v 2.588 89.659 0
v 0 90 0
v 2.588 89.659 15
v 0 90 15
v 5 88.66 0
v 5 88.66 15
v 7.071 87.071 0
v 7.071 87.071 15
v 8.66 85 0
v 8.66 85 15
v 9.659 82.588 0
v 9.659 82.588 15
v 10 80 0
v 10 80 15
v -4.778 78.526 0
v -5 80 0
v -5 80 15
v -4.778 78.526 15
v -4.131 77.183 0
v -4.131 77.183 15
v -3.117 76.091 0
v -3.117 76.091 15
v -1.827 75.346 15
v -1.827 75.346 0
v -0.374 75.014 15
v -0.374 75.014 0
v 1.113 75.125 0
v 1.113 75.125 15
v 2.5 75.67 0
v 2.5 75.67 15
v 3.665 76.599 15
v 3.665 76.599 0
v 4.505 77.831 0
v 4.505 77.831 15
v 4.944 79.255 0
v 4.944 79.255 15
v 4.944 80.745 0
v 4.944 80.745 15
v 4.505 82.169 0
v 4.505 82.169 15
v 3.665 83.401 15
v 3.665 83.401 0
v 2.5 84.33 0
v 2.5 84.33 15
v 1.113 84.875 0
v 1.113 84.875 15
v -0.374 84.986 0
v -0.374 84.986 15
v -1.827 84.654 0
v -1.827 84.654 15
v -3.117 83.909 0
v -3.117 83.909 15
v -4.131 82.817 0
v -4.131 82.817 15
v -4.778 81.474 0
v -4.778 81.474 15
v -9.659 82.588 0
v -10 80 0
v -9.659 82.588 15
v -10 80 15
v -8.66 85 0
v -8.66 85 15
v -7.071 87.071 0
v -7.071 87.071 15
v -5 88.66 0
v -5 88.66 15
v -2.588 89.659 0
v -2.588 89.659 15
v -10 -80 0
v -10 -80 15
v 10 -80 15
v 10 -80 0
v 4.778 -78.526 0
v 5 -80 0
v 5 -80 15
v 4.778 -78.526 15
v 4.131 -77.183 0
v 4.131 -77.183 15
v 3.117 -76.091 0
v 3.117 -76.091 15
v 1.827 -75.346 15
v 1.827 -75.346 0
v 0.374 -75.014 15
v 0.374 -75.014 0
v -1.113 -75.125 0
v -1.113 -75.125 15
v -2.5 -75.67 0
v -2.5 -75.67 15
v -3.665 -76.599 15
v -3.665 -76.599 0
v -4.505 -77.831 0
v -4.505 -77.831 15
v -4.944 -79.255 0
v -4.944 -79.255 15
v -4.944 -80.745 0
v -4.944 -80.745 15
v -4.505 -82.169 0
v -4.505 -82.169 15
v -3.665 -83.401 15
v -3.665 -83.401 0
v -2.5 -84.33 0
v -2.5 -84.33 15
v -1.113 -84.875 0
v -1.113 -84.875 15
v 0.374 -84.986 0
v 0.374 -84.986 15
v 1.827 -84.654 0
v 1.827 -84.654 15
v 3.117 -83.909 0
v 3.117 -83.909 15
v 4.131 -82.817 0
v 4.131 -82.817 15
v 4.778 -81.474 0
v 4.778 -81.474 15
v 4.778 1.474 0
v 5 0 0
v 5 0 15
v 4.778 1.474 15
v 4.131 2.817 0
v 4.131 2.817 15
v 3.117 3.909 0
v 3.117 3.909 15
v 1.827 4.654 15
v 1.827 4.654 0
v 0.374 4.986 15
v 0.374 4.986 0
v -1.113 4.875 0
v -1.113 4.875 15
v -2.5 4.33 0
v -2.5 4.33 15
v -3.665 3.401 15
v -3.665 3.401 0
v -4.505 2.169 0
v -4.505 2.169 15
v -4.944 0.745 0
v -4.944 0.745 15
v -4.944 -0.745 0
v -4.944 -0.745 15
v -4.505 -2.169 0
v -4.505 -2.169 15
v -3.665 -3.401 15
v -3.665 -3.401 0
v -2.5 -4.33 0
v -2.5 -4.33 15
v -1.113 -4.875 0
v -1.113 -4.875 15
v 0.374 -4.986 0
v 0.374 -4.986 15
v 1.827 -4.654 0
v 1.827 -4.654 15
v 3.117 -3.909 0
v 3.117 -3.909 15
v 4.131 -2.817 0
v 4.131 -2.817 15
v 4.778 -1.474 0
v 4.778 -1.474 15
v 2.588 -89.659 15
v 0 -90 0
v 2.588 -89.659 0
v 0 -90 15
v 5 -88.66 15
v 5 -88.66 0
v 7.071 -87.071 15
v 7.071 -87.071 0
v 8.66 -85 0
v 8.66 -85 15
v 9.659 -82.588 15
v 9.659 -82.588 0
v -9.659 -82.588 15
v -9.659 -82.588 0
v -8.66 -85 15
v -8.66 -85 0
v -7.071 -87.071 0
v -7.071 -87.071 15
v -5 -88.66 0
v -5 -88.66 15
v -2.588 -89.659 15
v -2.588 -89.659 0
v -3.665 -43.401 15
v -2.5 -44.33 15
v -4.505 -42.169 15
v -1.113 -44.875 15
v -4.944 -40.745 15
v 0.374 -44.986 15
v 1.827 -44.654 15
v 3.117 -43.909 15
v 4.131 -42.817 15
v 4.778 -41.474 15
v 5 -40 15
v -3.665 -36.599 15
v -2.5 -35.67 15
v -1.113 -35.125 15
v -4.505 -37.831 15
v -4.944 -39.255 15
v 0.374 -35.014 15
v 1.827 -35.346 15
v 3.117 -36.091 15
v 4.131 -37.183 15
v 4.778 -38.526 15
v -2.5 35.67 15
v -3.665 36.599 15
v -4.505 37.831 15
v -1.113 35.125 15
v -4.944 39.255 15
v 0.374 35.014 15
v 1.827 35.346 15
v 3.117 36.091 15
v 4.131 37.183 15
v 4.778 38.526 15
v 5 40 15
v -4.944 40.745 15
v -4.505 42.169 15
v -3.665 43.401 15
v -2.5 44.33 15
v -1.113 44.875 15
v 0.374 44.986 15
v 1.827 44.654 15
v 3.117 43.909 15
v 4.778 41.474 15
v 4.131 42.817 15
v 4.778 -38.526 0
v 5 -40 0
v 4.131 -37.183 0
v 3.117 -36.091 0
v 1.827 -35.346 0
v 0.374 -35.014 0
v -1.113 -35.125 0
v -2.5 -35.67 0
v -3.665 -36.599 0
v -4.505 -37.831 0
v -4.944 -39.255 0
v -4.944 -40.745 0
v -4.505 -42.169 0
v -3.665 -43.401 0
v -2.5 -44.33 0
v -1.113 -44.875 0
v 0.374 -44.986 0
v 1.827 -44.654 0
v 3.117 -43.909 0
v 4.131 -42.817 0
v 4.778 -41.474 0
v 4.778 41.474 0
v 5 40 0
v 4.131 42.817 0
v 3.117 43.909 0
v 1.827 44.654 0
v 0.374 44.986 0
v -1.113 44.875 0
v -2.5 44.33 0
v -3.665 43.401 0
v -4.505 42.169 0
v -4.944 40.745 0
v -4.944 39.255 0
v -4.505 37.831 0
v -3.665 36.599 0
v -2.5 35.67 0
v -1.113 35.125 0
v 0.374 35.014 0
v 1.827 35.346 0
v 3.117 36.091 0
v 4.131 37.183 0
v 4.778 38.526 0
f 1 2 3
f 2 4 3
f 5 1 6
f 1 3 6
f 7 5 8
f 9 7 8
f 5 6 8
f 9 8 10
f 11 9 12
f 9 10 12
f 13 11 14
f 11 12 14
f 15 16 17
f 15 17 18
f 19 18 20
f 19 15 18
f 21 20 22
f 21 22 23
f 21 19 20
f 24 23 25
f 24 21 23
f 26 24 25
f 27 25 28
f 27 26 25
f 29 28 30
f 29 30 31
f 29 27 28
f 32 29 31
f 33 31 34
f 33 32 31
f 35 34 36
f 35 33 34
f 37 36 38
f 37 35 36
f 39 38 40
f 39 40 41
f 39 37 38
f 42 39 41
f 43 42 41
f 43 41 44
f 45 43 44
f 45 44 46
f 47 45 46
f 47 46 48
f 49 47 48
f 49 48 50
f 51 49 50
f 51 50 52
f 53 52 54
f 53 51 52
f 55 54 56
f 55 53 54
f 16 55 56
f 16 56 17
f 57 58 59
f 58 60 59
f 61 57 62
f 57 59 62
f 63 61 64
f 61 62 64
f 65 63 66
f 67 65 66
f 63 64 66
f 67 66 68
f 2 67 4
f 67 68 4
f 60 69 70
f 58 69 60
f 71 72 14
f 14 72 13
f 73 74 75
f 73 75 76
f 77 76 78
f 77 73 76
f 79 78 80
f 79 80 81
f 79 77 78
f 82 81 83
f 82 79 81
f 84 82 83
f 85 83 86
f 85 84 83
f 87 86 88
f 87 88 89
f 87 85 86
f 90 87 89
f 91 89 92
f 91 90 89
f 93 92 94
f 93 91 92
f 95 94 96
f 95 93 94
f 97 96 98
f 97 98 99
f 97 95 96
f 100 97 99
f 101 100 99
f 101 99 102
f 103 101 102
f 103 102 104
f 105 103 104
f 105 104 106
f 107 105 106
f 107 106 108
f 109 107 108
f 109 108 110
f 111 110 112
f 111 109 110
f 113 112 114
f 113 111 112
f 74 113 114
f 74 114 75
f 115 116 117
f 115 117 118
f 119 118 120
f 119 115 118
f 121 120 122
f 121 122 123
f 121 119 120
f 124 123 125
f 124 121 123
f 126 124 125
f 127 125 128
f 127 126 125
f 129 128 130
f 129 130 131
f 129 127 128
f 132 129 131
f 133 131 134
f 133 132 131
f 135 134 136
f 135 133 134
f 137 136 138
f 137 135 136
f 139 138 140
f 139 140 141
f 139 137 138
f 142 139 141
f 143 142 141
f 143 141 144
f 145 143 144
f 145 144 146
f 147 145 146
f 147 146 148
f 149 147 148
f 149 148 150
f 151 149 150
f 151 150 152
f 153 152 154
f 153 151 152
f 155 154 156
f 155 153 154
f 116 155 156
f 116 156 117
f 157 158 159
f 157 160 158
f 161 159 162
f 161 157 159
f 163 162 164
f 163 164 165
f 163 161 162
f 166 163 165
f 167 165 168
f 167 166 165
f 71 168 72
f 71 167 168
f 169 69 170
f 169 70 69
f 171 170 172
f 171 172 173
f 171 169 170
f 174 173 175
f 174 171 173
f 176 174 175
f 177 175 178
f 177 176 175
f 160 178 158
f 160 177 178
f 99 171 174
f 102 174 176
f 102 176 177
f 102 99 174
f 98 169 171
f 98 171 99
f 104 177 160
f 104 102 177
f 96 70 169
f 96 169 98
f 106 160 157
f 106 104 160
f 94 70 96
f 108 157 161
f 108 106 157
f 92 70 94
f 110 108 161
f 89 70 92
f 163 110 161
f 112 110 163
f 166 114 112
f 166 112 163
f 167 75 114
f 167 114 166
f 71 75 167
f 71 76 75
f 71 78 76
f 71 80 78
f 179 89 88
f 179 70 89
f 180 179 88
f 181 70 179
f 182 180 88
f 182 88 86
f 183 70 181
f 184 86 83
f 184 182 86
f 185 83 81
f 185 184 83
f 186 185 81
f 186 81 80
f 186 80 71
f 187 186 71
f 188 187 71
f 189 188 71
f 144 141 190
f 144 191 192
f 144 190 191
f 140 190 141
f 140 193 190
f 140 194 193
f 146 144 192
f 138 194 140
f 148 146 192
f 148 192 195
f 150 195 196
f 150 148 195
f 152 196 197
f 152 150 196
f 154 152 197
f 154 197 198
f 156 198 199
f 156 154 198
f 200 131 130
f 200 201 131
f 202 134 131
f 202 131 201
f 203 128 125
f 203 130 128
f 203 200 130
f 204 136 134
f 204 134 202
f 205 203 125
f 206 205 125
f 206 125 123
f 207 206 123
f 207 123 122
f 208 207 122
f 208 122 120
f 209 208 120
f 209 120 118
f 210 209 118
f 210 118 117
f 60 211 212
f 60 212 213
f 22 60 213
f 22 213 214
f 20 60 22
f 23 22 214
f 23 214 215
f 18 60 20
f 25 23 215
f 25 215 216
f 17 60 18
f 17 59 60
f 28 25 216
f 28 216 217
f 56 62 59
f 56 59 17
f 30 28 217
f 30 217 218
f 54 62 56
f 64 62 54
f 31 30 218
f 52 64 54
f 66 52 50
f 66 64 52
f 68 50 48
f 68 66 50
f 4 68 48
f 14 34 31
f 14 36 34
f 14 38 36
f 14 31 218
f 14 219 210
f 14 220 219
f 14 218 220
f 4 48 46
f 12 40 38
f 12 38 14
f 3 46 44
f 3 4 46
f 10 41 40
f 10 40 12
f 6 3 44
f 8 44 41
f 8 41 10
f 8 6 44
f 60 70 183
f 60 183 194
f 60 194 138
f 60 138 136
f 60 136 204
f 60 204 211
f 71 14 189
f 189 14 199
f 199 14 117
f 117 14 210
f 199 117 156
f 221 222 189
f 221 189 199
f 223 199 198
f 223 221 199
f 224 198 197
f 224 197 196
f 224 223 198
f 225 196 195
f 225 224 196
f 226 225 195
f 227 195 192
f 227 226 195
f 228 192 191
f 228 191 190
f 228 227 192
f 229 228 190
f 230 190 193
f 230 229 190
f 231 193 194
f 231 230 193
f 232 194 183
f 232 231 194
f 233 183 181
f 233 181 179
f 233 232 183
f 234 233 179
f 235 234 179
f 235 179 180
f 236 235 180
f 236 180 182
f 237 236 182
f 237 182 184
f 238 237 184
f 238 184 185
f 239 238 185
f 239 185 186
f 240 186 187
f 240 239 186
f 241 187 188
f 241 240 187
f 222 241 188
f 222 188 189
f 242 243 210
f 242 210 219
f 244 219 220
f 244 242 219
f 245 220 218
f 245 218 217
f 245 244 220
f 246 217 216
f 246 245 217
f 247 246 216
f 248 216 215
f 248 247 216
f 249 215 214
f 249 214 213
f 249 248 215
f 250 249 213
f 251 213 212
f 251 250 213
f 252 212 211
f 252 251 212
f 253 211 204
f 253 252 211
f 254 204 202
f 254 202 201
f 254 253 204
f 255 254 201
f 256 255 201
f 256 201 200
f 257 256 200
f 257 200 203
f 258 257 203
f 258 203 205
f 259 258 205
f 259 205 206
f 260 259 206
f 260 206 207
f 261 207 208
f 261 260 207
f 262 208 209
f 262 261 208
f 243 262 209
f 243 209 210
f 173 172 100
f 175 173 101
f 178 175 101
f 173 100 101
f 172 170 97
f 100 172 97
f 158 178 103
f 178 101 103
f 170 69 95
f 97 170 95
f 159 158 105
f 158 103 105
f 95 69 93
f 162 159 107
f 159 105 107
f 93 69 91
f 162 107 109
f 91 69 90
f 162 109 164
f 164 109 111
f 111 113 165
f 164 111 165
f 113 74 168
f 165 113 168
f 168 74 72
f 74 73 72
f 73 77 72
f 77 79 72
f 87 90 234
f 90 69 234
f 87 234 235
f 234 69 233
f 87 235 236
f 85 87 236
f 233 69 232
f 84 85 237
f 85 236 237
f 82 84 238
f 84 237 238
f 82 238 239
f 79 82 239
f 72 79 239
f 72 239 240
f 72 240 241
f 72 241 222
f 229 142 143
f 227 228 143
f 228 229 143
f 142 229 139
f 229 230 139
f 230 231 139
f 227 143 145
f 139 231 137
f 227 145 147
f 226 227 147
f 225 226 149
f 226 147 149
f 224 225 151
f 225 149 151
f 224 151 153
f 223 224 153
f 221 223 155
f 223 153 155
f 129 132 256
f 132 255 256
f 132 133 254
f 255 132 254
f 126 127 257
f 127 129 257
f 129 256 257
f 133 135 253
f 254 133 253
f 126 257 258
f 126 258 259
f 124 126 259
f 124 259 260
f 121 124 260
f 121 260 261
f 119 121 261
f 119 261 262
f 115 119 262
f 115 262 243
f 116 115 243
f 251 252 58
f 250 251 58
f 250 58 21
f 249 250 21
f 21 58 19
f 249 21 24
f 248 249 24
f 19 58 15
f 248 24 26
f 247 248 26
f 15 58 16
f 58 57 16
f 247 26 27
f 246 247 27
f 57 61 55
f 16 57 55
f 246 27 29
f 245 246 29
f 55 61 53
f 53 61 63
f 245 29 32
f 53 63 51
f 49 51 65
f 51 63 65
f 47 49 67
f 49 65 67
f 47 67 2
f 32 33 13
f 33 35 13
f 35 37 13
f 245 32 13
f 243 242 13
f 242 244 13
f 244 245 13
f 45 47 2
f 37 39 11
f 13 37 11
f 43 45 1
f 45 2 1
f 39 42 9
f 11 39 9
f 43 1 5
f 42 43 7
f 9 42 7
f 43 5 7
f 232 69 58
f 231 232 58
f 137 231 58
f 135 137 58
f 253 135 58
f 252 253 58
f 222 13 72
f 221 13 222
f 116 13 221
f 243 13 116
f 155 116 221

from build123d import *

# Parameters (mm, degrees)
SKETCH_1_W      = 20
SKETCH_1_H      = 180
SKETCH_1_R      = 5
EXTRUDE_1_DEPTH = 15
FILLET_1_R      = 10


with BuildPart() as part:
    # 草图1 → 凸台-拉伸1 (new body)
    with BuildSketch(Plane.XY):
        Rectangle(SKETCH_1_W, SKETCH_1_H)
        with Locations((0, -80)):
            Circle(SKETCH_1_R, mode=Mode.SUBTRACT)
        with Locations(Location((0, 80, 0), (0, 0, 180))):
            Circle(SKETCH_1_R, mode=Mode.SUBTRACT)
        Circle(SKETCH_1_R, mode=Mode.SUBTRACT)
        with Locations((0, -40)):
            Circle(SKETCH_1_R, mode=Mode.SUBTRACT)
        with Locations((0, 40)):
            Circle(SKETCH_1_R, mode=Mode.SUBTRACT)
    extrude(amount=EXTRUDE_1_DEPTH)

    # 圆角1
    fillet_1_edges = [part.edges().sort_by_distance(p)[0] for p in [
        (-10, -90, 7.5),
        (10, -90, 7.5),
        (10, 90, 7.5),
        (-10, 90, 7.5),
    ]]
    fillet(fillet_1_edges, radius=FILLET_1_R - 0.0001)  # a hair under: the kernel refuses the full size


solid = part.part
